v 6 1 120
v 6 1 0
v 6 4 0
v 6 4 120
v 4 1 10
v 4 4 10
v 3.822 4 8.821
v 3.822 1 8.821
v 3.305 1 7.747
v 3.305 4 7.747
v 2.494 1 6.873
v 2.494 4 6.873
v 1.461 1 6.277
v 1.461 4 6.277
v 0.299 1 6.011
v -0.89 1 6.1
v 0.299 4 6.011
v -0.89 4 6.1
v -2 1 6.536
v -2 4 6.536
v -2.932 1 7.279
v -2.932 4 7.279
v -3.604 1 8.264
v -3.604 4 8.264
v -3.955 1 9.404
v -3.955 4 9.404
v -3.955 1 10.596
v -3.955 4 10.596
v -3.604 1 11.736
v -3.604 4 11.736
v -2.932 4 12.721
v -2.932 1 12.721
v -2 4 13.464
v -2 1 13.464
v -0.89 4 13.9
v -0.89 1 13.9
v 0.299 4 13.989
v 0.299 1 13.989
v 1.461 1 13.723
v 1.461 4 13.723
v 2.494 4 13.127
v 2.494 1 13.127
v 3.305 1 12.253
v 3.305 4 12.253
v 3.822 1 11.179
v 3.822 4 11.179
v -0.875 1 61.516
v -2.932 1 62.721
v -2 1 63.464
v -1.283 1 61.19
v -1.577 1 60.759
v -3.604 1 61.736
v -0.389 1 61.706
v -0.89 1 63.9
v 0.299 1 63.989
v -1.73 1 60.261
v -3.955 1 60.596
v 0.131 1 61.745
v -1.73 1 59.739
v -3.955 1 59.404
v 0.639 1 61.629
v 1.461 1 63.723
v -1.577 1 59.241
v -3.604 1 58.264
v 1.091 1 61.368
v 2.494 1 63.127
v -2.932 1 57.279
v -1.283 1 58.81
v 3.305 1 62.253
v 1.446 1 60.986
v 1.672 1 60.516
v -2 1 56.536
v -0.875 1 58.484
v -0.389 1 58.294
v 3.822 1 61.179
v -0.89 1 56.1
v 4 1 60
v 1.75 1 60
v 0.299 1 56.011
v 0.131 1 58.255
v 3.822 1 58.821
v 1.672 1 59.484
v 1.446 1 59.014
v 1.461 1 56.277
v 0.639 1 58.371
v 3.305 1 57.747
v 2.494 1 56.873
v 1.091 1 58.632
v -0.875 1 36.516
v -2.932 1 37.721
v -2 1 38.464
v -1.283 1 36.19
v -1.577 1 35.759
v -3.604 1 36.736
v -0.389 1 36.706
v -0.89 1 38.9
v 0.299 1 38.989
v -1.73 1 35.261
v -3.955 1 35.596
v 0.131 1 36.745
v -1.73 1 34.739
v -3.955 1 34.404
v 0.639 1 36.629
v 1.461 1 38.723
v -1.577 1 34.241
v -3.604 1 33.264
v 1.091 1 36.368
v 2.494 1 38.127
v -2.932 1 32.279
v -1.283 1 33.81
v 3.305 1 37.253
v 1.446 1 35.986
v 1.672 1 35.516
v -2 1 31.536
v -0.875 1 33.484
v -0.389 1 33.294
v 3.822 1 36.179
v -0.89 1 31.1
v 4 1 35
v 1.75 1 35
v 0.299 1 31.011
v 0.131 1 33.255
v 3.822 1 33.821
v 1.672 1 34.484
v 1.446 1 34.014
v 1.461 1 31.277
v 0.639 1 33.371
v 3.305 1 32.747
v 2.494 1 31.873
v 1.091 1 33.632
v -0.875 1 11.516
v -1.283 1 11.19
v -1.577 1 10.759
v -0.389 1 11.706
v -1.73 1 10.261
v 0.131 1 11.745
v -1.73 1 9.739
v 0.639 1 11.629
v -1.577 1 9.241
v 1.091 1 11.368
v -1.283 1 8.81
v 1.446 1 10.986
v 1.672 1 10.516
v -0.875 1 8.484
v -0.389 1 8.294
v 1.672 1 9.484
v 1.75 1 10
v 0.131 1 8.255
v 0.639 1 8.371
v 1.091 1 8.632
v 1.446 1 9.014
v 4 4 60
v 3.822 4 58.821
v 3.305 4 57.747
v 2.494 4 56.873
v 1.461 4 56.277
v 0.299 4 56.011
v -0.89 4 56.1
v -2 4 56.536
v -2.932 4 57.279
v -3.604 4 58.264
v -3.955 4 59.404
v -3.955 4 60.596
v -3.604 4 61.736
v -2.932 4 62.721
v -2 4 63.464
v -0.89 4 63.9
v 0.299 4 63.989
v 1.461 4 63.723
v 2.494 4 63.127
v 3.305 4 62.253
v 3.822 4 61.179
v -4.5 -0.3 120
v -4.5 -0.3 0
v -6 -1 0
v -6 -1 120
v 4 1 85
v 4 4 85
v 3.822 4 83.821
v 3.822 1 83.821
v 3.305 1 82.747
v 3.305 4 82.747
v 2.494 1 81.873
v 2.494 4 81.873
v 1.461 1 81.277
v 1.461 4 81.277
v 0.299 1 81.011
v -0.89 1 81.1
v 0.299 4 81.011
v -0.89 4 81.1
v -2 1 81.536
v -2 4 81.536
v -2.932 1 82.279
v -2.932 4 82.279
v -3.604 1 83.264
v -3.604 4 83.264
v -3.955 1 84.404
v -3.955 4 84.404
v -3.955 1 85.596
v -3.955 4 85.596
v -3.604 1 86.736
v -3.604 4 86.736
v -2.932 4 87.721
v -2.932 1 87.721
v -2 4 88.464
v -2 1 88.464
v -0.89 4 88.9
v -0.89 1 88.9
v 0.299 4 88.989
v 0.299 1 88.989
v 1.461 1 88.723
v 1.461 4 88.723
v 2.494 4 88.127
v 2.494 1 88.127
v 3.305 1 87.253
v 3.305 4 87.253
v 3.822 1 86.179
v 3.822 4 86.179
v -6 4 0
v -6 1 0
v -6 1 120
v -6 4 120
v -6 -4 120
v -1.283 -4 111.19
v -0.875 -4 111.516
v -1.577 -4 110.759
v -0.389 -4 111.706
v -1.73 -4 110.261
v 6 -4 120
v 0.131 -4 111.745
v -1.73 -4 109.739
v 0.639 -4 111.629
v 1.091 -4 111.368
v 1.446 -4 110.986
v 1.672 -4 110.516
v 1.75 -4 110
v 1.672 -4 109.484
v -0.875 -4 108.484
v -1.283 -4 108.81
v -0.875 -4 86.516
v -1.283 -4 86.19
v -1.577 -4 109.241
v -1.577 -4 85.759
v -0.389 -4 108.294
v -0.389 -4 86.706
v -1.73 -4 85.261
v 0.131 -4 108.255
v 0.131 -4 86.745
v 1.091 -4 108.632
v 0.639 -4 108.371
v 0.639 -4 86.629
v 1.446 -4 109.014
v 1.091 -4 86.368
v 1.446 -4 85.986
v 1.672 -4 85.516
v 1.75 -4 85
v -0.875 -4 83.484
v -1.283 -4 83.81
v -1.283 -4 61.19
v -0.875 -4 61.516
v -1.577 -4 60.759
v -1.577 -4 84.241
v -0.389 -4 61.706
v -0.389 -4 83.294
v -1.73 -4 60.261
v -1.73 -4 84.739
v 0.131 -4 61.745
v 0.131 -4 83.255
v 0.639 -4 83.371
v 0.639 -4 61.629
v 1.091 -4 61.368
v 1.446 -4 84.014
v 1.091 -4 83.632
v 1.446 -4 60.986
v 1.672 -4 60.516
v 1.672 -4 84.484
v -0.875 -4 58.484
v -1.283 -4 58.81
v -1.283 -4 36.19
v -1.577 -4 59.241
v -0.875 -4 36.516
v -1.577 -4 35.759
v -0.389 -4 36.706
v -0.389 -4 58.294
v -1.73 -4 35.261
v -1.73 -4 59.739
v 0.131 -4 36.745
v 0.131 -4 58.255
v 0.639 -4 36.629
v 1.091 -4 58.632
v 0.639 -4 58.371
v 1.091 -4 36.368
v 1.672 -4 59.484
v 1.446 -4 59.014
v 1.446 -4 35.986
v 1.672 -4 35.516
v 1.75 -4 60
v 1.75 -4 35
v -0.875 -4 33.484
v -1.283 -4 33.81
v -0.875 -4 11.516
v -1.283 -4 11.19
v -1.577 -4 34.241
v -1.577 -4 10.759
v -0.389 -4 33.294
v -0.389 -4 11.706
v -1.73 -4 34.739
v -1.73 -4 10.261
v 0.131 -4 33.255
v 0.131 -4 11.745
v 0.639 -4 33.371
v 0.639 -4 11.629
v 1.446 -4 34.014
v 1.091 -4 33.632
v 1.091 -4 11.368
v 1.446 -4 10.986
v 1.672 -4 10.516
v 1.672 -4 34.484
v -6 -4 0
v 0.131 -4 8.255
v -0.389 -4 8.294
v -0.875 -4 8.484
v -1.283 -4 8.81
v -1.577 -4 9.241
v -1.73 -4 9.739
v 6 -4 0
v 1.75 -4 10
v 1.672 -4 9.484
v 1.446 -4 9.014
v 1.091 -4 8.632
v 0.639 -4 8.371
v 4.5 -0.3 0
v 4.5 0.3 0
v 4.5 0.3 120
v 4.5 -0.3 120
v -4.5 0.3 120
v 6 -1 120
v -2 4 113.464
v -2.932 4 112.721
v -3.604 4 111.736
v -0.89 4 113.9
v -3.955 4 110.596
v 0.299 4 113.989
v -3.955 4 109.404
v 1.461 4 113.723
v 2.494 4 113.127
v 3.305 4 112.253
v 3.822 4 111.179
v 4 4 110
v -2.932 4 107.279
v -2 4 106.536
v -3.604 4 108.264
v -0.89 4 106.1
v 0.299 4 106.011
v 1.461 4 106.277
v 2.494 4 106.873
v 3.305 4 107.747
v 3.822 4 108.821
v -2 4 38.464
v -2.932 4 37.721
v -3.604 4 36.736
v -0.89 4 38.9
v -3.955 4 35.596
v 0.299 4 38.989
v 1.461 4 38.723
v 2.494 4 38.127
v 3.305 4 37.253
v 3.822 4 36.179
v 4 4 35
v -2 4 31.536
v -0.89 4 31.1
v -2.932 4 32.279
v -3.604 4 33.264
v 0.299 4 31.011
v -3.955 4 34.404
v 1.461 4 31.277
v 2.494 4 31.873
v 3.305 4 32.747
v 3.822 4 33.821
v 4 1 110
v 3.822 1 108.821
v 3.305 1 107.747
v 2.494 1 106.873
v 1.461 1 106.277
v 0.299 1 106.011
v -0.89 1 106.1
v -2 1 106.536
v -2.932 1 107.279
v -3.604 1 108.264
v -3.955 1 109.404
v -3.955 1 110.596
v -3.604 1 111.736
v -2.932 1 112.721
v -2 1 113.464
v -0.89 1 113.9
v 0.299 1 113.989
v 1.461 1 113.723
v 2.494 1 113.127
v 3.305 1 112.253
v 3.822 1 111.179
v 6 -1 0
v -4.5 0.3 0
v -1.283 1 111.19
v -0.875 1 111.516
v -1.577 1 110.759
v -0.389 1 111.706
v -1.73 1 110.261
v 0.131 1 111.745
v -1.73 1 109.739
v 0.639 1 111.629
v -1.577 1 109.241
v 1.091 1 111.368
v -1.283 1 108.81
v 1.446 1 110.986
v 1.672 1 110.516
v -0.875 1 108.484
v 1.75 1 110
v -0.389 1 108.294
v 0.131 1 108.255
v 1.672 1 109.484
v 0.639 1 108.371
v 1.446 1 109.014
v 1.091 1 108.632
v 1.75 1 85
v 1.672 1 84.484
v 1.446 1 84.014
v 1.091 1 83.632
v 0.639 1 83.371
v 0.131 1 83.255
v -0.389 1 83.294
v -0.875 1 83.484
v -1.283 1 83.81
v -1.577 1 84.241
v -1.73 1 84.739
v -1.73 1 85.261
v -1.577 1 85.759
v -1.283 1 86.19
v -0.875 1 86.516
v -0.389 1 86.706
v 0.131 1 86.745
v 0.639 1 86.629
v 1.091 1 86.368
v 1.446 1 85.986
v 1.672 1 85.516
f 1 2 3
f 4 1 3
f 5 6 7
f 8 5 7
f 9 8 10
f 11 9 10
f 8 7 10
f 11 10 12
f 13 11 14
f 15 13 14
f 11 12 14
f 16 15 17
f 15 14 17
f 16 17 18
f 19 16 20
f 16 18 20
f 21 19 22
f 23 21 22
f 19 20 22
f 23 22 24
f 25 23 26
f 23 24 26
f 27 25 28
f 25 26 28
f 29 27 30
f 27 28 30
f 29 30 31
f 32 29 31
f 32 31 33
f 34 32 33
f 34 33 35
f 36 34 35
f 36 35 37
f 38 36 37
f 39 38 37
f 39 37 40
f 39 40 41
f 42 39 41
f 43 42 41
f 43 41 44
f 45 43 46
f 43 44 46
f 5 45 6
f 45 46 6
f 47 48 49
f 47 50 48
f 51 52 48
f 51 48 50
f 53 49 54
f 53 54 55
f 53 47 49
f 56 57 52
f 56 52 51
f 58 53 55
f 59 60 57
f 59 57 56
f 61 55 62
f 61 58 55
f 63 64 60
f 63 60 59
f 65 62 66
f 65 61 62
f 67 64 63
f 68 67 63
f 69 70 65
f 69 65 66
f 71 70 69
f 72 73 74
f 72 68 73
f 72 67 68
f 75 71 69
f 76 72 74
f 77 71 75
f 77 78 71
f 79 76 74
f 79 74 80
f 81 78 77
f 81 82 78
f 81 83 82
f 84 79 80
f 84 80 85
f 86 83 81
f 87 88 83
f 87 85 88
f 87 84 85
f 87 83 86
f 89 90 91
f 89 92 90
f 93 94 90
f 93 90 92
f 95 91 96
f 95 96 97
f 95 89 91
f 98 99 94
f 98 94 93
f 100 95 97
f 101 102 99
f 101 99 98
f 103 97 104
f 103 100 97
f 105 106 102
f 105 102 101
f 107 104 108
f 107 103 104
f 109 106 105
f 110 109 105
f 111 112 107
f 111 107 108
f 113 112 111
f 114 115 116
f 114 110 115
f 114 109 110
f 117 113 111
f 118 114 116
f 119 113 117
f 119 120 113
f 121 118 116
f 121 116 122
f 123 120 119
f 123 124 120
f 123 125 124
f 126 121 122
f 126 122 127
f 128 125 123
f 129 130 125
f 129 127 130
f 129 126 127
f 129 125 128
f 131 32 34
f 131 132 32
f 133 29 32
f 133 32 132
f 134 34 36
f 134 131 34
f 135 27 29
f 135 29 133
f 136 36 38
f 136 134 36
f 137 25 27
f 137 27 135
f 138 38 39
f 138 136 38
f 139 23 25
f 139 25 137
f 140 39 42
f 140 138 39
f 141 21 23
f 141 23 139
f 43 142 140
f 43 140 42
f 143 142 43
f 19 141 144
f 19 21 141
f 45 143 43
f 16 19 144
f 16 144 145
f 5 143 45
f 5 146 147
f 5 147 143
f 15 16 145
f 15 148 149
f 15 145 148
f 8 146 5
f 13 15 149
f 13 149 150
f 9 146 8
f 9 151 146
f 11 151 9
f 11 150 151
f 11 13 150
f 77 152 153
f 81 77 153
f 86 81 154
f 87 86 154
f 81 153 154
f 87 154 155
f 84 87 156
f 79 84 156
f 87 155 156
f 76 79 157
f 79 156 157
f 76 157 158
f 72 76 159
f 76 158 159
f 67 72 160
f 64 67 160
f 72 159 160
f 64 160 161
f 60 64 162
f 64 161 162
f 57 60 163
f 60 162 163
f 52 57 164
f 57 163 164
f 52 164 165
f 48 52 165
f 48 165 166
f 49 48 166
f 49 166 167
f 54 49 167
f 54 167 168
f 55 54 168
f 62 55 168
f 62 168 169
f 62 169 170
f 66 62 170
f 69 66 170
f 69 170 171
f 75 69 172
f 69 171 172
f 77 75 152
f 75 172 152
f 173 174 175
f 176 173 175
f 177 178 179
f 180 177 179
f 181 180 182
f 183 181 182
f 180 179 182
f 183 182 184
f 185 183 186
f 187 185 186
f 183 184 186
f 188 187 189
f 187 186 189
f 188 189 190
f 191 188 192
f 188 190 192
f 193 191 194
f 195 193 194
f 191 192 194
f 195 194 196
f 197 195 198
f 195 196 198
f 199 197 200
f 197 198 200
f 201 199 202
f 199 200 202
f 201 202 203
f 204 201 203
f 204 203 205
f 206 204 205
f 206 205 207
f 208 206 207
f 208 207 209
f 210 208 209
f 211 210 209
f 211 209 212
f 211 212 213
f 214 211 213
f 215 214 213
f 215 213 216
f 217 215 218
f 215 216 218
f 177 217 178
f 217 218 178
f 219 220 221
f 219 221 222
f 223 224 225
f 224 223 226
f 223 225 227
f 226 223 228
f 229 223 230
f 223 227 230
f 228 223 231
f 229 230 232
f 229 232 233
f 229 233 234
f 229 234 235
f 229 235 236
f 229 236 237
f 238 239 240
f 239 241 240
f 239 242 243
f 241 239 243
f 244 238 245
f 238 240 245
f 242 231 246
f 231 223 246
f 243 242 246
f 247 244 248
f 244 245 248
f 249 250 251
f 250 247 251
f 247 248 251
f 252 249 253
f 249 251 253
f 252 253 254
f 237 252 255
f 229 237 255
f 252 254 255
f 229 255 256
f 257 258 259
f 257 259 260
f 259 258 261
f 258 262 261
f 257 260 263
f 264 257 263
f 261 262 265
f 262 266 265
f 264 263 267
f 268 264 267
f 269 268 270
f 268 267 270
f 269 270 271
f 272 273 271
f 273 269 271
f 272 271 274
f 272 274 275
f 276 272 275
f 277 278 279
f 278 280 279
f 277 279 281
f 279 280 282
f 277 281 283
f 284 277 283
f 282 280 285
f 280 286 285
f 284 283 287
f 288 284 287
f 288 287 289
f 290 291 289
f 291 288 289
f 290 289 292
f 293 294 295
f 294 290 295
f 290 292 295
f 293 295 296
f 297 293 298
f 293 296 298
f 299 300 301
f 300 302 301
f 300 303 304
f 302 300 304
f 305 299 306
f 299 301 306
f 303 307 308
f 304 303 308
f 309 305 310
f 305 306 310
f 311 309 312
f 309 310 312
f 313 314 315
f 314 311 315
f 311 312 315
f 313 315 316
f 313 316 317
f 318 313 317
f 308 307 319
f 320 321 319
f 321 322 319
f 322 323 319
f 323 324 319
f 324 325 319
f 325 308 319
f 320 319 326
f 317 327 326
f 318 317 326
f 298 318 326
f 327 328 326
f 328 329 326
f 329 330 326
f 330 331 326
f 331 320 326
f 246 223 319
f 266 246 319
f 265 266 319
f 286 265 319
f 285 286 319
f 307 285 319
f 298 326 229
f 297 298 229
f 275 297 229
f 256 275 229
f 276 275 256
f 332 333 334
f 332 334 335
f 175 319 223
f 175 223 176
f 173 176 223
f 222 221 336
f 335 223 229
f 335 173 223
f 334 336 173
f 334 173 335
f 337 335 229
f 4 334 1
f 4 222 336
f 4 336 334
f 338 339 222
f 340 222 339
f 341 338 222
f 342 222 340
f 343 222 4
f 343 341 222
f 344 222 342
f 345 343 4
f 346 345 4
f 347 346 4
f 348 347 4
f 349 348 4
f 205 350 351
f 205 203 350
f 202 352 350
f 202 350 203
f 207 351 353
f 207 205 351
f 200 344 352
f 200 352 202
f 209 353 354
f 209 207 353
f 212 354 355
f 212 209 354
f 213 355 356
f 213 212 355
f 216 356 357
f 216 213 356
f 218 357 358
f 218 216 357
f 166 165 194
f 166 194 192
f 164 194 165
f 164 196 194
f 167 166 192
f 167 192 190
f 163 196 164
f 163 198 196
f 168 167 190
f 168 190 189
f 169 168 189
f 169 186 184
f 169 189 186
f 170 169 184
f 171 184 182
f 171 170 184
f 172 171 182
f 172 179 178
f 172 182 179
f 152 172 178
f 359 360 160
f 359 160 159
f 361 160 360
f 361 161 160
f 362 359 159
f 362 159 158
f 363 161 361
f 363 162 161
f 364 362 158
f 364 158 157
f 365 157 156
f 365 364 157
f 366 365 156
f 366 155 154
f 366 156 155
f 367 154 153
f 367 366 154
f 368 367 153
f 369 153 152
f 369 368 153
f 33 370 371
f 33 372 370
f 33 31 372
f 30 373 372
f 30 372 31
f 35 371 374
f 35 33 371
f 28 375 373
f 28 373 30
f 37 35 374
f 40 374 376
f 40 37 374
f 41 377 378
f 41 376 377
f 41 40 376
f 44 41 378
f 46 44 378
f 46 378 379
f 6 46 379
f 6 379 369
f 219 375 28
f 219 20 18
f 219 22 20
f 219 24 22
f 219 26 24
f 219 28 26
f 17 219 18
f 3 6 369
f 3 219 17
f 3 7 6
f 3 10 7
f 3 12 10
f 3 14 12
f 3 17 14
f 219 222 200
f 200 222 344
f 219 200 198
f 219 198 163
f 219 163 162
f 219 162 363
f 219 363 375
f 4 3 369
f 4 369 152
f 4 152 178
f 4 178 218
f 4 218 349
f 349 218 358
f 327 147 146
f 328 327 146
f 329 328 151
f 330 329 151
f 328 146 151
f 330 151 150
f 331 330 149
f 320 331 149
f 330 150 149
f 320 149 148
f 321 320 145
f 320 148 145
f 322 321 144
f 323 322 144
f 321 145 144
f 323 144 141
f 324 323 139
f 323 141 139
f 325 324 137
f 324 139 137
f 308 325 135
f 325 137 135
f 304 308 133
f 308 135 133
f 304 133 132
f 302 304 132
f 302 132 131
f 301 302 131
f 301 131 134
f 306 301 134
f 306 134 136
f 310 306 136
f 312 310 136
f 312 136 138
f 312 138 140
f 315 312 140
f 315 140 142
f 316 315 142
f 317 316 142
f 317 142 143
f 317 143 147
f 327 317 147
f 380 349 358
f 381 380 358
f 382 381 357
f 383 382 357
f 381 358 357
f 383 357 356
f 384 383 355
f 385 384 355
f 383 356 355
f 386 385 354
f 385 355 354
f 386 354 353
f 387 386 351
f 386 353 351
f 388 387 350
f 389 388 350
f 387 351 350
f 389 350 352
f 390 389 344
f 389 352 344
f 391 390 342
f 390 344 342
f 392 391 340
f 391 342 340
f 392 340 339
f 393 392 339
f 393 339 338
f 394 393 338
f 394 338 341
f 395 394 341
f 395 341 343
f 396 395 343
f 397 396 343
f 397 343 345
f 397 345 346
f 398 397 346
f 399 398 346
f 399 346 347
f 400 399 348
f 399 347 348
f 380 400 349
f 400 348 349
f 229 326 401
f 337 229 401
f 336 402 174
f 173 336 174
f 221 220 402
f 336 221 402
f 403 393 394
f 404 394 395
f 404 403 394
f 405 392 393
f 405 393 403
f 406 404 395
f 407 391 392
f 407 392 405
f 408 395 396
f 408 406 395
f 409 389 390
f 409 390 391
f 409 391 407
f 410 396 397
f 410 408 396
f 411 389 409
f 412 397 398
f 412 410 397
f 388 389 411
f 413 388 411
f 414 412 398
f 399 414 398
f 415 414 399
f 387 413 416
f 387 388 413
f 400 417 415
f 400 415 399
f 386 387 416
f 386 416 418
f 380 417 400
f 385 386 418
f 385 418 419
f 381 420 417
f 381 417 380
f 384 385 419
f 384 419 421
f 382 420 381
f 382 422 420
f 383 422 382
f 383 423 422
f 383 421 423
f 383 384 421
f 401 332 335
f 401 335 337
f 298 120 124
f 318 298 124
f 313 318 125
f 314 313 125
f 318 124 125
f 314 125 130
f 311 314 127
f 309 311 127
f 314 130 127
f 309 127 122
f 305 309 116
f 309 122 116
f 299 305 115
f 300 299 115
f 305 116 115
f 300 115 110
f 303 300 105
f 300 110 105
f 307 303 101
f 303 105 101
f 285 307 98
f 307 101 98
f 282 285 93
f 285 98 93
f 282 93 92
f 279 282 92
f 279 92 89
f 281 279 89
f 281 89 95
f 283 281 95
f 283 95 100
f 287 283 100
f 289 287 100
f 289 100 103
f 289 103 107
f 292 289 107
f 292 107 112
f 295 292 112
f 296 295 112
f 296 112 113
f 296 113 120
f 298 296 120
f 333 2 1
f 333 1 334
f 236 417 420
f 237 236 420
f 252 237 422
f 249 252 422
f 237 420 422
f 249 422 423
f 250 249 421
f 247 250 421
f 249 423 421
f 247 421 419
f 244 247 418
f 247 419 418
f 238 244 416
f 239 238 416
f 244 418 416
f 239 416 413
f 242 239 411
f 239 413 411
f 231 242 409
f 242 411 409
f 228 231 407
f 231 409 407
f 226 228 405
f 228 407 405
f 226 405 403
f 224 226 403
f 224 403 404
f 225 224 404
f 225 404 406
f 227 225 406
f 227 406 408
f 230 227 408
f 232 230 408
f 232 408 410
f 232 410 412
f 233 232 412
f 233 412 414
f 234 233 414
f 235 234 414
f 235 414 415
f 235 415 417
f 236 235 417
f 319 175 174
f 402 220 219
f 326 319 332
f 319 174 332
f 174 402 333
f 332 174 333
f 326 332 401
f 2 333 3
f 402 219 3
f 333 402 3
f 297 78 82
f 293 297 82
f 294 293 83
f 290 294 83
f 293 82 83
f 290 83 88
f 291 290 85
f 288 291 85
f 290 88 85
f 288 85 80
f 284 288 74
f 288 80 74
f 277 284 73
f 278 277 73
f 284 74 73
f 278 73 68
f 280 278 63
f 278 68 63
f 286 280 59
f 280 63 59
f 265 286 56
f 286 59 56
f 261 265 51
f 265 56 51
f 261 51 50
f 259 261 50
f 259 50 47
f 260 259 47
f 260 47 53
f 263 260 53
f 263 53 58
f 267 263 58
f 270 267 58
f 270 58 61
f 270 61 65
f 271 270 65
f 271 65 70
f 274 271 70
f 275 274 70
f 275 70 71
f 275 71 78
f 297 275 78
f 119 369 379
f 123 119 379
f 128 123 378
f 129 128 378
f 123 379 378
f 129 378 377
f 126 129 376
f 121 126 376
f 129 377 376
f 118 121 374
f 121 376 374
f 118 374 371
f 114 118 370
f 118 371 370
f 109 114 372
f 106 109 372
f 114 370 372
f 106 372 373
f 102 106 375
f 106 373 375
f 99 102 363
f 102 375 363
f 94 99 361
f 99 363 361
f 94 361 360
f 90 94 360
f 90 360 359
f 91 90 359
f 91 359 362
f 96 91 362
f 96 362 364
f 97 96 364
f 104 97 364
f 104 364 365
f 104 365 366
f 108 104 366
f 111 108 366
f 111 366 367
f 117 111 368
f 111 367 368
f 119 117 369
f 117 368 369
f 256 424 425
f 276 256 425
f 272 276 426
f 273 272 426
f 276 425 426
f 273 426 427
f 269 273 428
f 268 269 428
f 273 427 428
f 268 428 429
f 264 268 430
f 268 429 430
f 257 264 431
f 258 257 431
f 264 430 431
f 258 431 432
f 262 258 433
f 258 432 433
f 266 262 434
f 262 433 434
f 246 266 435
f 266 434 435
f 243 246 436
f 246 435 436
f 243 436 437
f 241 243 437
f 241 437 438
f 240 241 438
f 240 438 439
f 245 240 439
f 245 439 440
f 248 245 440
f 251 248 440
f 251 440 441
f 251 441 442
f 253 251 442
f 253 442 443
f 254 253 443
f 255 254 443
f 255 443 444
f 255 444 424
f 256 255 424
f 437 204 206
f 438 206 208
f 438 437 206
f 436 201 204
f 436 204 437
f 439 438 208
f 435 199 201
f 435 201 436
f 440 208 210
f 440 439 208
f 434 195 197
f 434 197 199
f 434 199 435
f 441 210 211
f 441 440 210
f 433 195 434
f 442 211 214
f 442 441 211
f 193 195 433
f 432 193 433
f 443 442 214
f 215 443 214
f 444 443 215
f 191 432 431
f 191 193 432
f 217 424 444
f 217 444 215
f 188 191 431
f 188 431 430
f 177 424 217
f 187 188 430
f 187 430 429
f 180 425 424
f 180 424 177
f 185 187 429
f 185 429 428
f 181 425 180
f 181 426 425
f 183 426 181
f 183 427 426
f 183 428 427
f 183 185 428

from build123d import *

# Parameters (mm, degrees)
SKETCH_1_W          = 12
SKETCH_1_H          = 8
EXTRUDE_1_DEPTH     = 120
SKETCH_2_R          = 1.75
CUT_EXTRUDE_1_DEPTH = 9
SKETCH_3_R          = 4
CUT_EXTRUDE_2_DEPTH = 3
CUT_EXTRUDE_3_DEPTH = 121


with BuildPart() as part:
    # 草图1 → 凸台-拉伸1 (new body)
    with BuildSketch(Plane.XY):
        Rectangle(SKETCH_1_W, SKETCH_1_H)
    extrude(amount=EXTRUDE_1_DEPTH)

    # 草图2 → 切除-拉伸1 (cut, through all)
    with BuildSketch(Plane(origin=(0, 4, 0), x_dir=(1, 0, 0), z_dir=(0, 1, 0))):
        with Locations((0, -10)):
            Circle(SKETCH_2_R)
        with Locations((0, -35)):
            Circle(SKETCH_2_R)
        with Locations((0, -60)):
            Circle(SKETCH_2_R)
        with Locations((0, -85)):
            Circle(SKETCH_2_R)
        with Locations((0, -110)):
            Circle(SKETCH_2_R)
        with Locations((0, -135)):
            Circle(SKETCH_2_R)
        with Locations((0, -160)):
            Circle(SKETCH_2_R)
        with Locations((0, -185)):
            Circle(SKETCH_2_R)
        with Locations((0, -210)):
            Circle(SKETCH_2_R)
        with Locations((0, -235)):
            Circle(SKETCH_2_R)
        with Locations((0, -260)):
            Circle(SKETCH_2_R)
        with Locations((0, -285)):
            Circle(SKETCH_2_R)
    extrude(amount=-CUT_EXTRUDE_1_DEPTH, mode=Mode.SUBTRACT)

    # 草图3 → 切除-拉伸2 (cut)
    with BuildSketch(Plane(origin=(0, 4, 0), x_dir=(1, 0, 0), z_dir=(0, 1, 0))):
        with Locations((0, -10)):
            Circle(SKETCH_3_R)
        with Locations((0, -35)):
            Circle(SKETCH_3_R)
        with Locations((0, -60)):
            Circle(SKETCH_3_R)
        with Locations((0, -85)):
            Circle(SKETCH_3_R)
        with Locations((0, -110)):
            Circle(SKETCH_3_R)
        with Locations((0, -135)):
            Circle(SKETCH_3_R)
        with Locations((0, -160)):
            Circle(SKETCH_3_R)
        with Locations((0, -185)):
            Circle(SKETCH_3_R)
        with Locations((0, -210)):
            Circle(SKETCH_3_R)
        with Locations((0, -235)):
            Circle(SKETCH_3_R)
        with Locations((0, -260)):
            Circle(SKETCH_3_R)
        with Locations((0, -285)):
            Circle(SKETCH_3_R)
    extrude(amount=-CUT_EXTRUDE_2_DEPTH, mode=Mode.SUBTRACT)

    # 草图4 → 切除-拉伸3 (cut, through all)
    with BuildSketch(Plane(origin=(0, 0, 0), x_dir=(-1, 0, 0), z_dir=(0, 0, -1))):
        Polygon((6, 1), (4.5, 0.3), (4.5, -0.3), (6, -1), align=None)
        Polygon((-6, 1), (-4.5, 0.3), (-4.5, -0.3), (-6, -1), align=None)
    extrude(amount=-CUT_EXTRUDE_3_DEPTH, mode=Mode.SUBTRACT)


solid = part.part
